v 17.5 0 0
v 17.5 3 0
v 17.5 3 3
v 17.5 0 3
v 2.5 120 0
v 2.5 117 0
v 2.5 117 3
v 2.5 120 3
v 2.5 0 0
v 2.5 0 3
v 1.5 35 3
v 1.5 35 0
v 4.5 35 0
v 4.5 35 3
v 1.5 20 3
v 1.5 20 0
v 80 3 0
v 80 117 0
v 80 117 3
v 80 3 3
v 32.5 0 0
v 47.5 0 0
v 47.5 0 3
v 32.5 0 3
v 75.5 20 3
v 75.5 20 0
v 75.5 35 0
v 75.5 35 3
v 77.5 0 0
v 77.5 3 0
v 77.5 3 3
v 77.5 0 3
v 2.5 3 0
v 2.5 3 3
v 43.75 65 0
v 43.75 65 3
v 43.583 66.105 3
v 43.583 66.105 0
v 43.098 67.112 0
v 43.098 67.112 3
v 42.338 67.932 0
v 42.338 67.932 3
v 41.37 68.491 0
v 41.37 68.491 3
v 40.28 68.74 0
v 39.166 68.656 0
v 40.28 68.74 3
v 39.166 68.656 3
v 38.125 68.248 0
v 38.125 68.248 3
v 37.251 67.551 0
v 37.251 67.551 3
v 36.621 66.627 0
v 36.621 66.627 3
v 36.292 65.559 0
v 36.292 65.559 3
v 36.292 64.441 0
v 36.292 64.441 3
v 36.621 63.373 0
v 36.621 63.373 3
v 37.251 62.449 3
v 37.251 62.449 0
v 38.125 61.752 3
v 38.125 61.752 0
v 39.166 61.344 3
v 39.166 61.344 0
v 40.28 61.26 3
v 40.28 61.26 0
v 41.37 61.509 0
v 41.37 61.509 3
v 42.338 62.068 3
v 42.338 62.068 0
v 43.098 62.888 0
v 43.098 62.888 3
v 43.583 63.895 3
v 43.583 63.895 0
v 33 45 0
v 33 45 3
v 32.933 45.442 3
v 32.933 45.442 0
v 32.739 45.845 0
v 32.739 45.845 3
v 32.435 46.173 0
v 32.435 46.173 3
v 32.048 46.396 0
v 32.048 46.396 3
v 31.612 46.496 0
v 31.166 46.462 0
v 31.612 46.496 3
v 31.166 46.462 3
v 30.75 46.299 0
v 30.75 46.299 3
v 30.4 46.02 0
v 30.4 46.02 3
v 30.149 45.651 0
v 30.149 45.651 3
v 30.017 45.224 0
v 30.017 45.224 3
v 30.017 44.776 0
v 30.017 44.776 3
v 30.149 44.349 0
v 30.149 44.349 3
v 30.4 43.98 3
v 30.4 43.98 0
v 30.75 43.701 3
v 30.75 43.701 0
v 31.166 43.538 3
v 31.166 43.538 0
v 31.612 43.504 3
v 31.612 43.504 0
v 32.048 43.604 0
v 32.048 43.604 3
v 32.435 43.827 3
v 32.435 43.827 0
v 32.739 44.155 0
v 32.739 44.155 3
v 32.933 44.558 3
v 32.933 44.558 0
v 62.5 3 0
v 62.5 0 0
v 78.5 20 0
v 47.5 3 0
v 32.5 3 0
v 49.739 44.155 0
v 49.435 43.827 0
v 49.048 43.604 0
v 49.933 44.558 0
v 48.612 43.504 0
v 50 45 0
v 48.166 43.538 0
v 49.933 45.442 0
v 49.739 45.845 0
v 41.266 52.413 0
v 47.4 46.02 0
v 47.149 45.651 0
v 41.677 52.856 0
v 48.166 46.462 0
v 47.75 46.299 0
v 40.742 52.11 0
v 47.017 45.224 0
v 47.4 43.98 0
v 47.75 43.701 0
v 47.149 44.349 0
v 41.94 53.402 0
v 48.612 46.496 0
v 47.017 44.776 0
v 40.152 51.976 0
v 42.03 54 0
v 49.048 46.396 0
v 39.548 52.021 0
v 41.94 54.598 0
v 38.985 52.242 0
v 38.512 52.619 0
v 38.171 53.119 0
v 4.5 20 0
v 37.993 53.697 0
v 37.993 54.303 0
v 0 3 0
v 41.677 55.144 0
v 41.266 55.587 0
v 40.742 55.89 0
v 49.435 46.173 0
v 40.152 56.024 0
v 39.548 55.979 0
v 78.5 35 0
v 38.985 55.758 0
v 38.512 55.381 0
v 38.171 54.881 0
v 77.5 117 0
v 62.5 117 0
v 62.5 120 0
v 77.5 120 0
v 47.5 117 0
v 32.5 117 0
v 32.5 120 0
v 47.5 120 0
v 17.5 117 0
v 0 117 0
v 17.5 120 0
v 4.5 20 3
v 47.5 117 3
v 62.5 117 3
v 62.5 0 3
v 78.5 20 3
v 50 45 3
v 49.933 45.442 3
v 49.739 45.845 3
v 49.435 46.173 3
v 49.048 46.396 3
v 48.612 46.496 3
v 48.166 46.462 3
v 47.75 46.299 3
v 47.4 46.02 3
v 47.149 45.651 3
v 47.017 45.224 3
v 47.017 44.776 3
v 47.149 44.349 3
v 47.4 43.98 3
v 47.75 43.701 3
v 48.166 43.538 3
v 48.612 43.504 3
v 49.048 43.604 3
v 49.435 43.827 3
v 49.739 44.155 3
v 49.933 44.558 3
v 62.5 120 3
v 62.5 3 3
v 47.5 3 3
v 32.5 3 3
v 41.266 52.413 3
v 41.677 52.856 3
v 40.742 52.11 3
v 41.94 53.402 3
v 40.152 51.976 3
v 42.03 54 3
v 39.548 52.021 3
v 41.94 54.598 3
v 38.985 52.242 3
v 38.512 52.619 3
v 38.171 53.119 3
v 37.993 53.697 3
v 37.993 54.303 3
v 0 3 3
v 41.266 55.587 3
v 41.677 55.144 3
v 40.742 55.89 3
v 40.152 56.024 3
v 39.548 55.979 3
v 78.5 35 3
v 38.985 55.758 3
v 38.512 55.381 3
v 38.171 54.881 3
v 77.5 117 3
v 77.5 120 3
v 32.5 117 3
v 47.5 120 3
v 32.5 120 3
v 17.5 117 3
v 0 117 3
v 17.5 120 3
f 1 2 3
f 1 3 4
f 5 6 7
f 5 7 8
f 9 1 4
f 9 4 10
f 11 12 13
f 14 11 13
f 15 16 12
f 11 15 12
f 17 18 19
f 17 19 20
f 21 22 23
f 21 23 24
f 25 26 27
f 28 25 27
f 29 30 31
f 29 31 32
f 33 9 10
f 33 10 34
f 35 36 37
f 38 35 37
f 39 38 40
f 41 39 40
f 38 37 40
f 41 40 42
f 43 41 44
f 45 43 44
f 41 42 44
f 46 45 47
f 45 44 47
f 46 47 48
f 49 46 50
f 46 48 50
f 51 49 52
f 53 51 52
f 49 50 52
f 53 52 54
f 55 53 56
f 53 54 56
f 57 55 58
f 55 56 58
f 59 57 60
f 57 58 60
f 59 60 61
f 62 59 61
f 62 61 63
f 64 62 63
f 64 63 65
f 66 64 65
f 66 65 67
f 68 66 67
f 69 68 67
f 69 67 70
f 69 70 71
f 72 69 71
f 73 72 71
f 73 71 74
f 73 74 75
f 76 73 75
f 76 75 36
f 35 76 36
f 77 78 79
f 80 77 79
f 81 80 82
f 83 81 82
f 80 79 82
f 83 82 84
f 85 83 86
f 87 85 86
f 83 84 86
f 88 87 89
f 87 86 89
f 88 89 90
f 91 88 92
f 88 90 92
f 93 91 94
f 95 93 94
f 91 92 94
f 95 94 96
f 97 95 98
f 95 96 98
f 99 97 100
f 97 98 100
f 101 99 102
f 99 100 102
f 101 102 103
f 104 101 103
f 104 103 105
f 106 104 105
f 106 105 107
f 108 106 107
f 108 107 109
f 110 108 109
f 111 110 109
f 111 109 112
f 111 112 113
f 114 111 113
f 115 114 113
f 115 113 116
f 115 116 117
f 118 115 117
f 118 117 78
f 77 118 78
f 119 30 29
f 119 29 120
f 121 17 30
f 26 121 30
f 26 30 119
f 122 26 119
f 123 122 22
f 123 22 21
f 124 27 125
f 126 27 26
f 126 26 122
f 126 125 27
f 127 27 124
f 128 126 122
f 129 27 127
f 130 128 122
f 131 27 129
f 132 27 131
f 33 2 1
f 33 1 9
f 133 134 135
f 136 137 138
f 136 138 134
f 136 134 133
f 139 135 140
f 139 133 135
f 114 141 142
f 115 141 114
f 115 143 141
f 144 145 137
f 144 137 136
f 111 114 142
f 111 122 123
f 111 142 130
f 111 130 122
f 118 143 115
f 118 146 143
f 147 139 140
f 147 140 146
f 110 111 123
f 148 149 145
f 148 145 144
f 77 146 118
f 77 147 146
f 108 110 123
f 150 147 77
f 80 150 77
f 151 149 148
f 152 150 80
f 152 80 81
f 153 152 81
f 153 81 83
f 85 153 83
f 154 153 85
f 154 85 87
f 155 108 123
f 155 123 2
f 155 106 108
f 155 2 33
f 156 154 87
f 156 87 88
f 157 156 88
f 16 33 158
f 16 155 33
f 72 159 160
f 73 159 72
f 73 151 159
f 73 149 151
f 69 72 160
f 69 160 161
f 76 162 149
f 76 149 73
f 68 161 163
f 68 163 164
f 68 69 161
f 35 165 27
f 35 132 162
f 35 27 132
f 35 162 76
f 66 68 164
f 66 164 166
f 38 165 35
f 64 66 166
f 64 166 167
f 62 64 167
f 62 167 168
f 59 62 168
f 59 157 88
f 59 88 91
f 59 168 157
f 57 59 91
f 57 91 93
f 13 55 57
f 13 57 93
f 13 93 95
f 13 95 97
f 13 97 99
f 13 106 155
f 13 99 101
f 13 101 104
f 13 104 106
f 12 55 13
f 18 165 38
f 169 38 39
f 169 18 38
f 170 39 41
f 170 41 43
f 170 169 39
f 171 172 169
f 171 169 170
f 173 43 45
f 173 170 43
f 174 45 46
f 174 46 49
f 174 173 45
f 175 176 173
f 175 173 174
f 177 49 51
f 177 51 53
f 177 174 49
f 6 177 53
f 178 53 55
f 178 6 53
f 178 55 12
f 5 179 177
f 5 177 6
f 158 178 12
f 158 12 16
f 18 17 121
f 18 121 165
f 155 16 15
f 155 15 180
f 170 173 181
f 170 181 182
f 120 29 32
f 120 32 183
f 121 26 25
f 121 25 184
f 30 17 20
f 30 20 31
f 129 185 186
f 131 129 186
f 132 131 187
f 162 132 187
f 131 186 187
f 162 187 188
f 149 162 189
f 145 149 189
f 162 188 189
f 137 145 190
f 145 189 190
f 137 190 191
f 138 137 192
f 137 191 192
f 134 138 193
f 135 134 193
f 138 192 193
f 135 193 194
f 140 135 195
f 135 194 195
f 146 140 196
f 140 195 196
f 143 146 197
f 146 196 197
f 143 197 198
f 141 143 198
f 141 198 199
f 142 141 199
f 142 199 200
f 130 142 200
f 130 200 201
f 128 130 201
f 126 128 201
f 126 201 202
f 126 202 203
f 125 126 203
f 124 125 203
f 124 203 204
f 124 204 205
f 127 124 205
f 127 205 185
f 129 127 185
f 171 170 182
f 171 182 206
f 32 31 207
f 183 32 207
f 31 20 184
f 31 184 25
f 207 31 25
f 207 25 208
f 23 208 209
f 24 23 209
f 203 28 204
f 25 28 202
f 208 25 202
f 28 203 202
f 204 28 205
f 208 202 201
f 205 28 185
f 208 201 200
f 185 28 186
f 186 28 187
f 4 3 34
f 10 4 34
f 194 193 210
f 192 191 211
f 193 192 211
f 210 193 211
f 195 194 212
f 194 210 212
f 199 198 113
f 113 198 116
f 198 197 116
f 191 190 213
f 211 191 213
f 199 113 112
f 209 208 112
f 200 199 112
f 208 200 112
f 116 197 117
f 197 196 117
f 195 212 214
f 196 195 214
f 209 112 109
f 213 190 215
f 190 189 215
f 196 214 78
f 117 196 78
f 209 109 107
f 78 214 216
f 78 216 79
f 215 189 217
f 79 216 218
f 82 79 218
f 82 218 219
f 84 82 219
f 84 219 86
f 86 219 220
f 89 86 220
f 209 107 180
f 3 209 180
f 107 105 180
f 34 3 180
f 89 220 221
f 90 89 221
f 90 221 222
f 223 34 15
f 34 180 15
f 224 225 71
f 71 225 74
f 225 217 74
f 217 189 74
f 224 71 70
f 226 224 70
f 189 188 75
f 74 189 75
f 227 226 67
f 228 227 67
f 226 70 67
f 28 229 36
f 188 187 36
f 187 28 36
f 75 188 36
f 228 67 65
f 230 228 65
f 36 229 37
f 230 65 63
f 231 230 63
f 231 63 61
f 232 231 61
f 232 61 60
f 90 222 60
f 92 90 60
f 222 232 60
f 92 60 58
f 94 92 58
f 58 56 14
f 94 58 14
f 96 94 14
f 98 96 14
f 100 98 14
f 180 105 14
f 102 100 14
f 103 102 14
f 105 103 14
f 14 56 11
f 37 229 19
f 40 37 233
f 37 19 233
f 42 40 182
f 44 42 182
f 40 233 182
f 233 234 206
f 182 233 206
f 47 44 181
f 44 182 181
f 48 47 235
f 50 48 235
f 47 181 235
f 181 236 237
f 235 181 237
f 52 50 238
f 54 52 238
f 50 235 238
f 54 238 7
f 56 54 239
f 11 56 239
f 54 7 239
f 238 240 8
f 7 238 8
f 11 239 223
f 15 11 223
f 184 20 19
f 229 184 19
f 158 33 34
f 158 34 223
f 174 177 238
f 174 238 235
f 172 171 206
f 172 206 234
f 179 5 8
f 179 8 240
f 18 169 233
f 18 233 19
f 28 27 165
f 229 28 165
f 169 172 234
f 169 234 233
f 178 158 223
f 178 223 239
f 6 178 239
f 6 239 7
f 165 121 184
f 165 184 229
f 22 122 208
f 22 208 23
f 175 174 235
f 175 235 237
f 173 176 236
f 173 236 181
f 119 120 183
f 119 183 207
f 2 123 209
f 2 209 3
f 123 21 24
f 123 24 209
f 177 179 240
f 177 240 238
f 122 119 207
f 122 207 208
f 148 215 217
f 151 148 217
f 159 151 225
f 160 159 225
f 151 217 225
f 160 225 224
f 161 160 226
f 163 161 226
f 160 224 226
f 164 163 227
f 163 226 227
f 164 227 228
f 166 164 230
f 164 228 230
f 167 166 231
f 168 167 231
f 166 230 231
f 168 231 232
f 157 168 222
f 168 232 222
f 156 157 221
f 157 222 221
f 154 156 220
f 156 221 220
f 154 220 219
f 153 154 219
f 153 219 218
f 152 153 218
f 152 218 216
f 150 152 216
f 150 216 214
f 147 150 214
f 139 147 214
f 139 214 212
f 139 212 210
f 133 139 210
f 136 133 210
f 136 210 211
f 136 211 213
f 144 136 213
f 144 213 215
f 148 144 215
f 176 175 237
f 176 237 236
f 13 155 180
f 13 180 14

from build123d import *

# Parameters (mm, degrees)
SKETCH_1_W          = 3
SKETCH_1_H          = 15
EXTRUDE_1_DEPTH     = 3
SKETCH_2_R          = 1.5
SKETCH_2_R_2        = 2.03
SKETCH_2_R_3        = 3.75
CUT_EXTRUDE_1_DEPTH = 10


with BuildPart() as part:
    # 草图1 → 凸台-拉伸1 (new body)
    with BuildSketch(Plane.XY):
        Polygon((2.5, 3), (0, 3), (0, 117), (2.5, 117), (2.5, 120), (17.5, 120), (17.5, 117), (32.5, 117), (32.5, 120), (47.5, 120), (47.5, 117), (62.5, 117), (62.5, 120), (77.5, 120), (77.5, 117), (80, 117), (80, 3), (77.5, 3), (77.5, 0), (62.5, 0), (62.5, 3), (47.5, 3), (47.5, 0), (32.5, 0), (32.5, 3), (17.5, 3), (17.5, 0), (2.5, 0), align=None)
        with Locations((77, 27.5)):
            Rectangle(SKETCH_1_W, SKETCH_1_H, mode=Mode.SUBTRACT)
        with Locations((3, 27.5)):
            Rectangle(SKETCH_1_W, SKETCH_1_H, mode=Mode.SUBTRACT)
    extrude(amount=EXTRUDE_1_DEPTH)

    # 草图2 → 切除-拉伸1 (cut)
    with BuildSketch(Plane.XY.offset(3)):
        with Locations((31.5, 45)):
            Circle(SKETCH_2_R)
        with Locations((48.5, 45)):
            Circle(SKETCH_2_R)
        with Locations((40, 54)):
            Circle(SKETCH_2_R_2)
        with Locations((40, 65)):
            Circle(SKETCH_2_R_3)
    extrude(amount=-CUT_EXTRUDE_1_DEPTH, mode=Mode.SUBTRACT)


solid = part.part
